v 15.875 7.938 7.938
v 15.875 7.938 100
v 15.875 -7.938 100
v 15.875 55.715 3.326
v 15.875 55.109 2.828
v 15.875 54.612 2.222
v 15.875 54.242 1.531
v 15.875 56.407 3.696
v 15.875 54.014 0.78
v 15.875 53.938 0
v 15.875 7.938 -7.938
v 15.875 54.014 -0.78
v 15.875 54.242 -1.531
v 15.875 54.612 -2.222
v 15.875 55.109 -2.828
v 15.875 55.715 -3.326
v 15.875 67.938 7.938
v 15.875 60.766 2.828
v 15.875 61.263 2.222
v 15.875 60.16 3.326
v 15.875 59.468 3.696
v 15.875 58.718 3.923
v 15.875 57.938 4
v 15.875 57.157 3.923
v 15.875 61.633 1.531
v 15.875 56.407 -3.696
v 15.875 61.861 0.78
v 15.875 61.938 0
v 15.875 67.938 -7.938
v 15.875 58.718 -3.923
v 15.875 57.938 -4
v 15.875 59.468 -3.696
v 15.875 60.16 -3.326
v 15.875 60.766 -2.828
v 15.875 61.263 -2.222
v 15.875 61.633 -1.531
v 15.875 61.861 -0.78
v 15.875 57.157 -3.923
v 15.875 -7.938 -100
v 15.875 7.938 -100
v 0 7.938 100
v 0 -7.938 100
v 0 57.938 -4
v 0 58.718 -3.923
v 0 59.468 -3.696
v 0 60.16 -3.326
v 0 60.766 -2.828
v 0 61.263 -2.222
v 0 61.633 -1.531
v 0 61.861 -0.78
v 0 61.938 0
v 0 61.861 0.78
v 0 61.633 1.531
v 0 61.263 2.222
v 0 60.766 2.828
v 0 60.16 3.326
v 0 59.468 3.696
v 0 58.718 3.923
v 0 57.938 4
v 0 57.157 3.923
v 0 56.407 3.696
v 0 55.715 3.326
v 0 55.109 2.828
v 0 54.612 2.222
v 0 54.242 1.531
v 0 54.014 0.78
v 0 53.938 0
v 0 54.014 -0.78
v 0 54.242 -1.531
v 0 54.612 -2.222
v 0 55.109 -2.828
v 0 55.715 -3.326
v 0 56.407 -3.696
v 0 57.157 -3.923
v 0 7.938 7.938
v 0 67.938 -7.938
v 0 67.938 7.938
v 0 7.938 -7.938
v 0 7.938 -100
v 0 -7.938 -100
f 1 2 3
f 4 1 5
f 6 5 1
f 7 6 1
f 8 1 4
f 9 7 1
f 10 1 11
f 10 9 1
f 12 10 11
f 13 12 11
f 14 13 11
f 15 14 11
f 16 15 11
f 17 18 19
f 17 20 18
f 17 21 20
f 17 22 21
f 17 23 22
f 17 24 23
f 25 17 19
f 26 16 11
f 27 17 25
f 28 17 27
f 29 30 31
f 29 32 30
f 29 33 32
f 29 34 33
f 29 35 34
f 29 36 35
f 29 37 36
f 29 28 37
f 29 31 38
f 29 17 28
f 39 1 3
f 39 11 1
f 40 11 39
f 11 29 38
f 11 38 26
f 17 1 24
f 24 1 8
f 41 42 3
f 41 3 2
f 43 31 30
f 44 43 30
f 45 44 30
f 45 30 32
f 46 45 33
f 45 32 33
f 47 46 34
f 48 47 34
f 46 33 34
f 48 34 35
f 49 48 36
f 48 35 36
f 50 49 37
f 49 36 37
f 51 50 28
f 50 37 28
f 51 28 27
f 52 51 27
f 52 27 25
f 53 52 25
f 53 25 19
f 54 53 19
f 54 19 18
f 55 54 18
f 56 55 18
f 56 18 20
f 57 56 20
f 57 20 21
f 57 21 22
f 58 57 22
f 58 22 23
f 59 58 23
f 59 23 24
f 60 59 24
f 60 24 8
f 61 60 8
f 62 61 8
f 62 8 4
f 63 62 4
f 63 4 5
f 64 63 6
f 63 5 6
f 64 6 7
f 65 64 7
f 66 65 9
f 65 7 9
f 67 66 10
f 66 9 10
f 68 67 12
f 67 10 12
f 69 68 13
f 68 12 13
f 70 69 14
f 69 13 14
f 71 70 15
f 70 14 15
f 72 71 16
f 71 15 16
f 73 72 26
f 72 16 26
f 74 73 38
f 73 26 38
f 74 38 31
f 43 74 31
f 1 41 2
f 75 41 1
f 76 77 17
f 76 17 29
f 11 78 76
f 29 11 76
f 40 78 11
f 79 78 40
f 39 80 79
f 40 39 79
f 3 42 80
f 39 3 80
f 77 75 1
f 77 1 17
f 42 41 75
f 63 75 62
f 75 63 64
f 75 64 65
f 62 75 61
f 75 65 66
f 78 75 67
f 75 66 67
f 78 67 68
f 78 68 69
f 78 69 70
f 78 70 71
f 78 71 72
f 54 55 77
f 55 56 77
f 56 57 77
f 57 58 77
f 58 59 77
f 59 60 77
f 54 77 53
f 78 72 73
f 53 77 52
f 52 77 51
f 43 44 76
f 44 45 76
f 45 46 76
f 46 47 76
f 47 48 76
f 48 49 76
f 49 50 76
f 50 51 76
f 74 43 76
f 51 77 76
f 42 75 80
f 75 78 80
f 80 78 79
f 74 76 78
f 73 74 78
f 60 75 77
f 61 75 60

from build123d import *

# Parameters (mm, degrees)
SKETCH1_W           = 200
SKETCH1_H           = 15.875
SKETCH1_W_2         = 15.875
SKETCH1_H_2         = 60
BOSS_EXTRUDE1_DEPTH = 15.875
SKETCH2_R           = 4
CUT_EXTRUDE1_DEPTH  = 16.875


with BuildPart() as part:
    # Sketch1 → Boss-Extrude1 (new body)
    with BuildSketch(Plane(origin=(0, 0, 0), x_dir=(0, 0, -1), z_dir=(1, 0, 0))):
        Rectangle(SKETCH1_W, SKETCH1_H)
        with Locations((0, 37.9375)):
            Rectangle(SKETCH1_W_2, SKETCH1_H_2)
    extrude(amount=BOSS_EXTRUDE1_DEPTH)

    # Sketch2 → Cut-Extrude1 (cut, through all)
    with BuildSketch(Plane(origin=(15.875, 0, 0), x_dir=(0, 0, -1), z_dir=(1, 0, 0))):
        with Locations((0, 57.9375)):
            Circle(SKETCH2_R)
    extrude(amount=-CUT_EXTRUDE1_DEPTH, mode=Mode.SUBTRACT)


solid = part.part
